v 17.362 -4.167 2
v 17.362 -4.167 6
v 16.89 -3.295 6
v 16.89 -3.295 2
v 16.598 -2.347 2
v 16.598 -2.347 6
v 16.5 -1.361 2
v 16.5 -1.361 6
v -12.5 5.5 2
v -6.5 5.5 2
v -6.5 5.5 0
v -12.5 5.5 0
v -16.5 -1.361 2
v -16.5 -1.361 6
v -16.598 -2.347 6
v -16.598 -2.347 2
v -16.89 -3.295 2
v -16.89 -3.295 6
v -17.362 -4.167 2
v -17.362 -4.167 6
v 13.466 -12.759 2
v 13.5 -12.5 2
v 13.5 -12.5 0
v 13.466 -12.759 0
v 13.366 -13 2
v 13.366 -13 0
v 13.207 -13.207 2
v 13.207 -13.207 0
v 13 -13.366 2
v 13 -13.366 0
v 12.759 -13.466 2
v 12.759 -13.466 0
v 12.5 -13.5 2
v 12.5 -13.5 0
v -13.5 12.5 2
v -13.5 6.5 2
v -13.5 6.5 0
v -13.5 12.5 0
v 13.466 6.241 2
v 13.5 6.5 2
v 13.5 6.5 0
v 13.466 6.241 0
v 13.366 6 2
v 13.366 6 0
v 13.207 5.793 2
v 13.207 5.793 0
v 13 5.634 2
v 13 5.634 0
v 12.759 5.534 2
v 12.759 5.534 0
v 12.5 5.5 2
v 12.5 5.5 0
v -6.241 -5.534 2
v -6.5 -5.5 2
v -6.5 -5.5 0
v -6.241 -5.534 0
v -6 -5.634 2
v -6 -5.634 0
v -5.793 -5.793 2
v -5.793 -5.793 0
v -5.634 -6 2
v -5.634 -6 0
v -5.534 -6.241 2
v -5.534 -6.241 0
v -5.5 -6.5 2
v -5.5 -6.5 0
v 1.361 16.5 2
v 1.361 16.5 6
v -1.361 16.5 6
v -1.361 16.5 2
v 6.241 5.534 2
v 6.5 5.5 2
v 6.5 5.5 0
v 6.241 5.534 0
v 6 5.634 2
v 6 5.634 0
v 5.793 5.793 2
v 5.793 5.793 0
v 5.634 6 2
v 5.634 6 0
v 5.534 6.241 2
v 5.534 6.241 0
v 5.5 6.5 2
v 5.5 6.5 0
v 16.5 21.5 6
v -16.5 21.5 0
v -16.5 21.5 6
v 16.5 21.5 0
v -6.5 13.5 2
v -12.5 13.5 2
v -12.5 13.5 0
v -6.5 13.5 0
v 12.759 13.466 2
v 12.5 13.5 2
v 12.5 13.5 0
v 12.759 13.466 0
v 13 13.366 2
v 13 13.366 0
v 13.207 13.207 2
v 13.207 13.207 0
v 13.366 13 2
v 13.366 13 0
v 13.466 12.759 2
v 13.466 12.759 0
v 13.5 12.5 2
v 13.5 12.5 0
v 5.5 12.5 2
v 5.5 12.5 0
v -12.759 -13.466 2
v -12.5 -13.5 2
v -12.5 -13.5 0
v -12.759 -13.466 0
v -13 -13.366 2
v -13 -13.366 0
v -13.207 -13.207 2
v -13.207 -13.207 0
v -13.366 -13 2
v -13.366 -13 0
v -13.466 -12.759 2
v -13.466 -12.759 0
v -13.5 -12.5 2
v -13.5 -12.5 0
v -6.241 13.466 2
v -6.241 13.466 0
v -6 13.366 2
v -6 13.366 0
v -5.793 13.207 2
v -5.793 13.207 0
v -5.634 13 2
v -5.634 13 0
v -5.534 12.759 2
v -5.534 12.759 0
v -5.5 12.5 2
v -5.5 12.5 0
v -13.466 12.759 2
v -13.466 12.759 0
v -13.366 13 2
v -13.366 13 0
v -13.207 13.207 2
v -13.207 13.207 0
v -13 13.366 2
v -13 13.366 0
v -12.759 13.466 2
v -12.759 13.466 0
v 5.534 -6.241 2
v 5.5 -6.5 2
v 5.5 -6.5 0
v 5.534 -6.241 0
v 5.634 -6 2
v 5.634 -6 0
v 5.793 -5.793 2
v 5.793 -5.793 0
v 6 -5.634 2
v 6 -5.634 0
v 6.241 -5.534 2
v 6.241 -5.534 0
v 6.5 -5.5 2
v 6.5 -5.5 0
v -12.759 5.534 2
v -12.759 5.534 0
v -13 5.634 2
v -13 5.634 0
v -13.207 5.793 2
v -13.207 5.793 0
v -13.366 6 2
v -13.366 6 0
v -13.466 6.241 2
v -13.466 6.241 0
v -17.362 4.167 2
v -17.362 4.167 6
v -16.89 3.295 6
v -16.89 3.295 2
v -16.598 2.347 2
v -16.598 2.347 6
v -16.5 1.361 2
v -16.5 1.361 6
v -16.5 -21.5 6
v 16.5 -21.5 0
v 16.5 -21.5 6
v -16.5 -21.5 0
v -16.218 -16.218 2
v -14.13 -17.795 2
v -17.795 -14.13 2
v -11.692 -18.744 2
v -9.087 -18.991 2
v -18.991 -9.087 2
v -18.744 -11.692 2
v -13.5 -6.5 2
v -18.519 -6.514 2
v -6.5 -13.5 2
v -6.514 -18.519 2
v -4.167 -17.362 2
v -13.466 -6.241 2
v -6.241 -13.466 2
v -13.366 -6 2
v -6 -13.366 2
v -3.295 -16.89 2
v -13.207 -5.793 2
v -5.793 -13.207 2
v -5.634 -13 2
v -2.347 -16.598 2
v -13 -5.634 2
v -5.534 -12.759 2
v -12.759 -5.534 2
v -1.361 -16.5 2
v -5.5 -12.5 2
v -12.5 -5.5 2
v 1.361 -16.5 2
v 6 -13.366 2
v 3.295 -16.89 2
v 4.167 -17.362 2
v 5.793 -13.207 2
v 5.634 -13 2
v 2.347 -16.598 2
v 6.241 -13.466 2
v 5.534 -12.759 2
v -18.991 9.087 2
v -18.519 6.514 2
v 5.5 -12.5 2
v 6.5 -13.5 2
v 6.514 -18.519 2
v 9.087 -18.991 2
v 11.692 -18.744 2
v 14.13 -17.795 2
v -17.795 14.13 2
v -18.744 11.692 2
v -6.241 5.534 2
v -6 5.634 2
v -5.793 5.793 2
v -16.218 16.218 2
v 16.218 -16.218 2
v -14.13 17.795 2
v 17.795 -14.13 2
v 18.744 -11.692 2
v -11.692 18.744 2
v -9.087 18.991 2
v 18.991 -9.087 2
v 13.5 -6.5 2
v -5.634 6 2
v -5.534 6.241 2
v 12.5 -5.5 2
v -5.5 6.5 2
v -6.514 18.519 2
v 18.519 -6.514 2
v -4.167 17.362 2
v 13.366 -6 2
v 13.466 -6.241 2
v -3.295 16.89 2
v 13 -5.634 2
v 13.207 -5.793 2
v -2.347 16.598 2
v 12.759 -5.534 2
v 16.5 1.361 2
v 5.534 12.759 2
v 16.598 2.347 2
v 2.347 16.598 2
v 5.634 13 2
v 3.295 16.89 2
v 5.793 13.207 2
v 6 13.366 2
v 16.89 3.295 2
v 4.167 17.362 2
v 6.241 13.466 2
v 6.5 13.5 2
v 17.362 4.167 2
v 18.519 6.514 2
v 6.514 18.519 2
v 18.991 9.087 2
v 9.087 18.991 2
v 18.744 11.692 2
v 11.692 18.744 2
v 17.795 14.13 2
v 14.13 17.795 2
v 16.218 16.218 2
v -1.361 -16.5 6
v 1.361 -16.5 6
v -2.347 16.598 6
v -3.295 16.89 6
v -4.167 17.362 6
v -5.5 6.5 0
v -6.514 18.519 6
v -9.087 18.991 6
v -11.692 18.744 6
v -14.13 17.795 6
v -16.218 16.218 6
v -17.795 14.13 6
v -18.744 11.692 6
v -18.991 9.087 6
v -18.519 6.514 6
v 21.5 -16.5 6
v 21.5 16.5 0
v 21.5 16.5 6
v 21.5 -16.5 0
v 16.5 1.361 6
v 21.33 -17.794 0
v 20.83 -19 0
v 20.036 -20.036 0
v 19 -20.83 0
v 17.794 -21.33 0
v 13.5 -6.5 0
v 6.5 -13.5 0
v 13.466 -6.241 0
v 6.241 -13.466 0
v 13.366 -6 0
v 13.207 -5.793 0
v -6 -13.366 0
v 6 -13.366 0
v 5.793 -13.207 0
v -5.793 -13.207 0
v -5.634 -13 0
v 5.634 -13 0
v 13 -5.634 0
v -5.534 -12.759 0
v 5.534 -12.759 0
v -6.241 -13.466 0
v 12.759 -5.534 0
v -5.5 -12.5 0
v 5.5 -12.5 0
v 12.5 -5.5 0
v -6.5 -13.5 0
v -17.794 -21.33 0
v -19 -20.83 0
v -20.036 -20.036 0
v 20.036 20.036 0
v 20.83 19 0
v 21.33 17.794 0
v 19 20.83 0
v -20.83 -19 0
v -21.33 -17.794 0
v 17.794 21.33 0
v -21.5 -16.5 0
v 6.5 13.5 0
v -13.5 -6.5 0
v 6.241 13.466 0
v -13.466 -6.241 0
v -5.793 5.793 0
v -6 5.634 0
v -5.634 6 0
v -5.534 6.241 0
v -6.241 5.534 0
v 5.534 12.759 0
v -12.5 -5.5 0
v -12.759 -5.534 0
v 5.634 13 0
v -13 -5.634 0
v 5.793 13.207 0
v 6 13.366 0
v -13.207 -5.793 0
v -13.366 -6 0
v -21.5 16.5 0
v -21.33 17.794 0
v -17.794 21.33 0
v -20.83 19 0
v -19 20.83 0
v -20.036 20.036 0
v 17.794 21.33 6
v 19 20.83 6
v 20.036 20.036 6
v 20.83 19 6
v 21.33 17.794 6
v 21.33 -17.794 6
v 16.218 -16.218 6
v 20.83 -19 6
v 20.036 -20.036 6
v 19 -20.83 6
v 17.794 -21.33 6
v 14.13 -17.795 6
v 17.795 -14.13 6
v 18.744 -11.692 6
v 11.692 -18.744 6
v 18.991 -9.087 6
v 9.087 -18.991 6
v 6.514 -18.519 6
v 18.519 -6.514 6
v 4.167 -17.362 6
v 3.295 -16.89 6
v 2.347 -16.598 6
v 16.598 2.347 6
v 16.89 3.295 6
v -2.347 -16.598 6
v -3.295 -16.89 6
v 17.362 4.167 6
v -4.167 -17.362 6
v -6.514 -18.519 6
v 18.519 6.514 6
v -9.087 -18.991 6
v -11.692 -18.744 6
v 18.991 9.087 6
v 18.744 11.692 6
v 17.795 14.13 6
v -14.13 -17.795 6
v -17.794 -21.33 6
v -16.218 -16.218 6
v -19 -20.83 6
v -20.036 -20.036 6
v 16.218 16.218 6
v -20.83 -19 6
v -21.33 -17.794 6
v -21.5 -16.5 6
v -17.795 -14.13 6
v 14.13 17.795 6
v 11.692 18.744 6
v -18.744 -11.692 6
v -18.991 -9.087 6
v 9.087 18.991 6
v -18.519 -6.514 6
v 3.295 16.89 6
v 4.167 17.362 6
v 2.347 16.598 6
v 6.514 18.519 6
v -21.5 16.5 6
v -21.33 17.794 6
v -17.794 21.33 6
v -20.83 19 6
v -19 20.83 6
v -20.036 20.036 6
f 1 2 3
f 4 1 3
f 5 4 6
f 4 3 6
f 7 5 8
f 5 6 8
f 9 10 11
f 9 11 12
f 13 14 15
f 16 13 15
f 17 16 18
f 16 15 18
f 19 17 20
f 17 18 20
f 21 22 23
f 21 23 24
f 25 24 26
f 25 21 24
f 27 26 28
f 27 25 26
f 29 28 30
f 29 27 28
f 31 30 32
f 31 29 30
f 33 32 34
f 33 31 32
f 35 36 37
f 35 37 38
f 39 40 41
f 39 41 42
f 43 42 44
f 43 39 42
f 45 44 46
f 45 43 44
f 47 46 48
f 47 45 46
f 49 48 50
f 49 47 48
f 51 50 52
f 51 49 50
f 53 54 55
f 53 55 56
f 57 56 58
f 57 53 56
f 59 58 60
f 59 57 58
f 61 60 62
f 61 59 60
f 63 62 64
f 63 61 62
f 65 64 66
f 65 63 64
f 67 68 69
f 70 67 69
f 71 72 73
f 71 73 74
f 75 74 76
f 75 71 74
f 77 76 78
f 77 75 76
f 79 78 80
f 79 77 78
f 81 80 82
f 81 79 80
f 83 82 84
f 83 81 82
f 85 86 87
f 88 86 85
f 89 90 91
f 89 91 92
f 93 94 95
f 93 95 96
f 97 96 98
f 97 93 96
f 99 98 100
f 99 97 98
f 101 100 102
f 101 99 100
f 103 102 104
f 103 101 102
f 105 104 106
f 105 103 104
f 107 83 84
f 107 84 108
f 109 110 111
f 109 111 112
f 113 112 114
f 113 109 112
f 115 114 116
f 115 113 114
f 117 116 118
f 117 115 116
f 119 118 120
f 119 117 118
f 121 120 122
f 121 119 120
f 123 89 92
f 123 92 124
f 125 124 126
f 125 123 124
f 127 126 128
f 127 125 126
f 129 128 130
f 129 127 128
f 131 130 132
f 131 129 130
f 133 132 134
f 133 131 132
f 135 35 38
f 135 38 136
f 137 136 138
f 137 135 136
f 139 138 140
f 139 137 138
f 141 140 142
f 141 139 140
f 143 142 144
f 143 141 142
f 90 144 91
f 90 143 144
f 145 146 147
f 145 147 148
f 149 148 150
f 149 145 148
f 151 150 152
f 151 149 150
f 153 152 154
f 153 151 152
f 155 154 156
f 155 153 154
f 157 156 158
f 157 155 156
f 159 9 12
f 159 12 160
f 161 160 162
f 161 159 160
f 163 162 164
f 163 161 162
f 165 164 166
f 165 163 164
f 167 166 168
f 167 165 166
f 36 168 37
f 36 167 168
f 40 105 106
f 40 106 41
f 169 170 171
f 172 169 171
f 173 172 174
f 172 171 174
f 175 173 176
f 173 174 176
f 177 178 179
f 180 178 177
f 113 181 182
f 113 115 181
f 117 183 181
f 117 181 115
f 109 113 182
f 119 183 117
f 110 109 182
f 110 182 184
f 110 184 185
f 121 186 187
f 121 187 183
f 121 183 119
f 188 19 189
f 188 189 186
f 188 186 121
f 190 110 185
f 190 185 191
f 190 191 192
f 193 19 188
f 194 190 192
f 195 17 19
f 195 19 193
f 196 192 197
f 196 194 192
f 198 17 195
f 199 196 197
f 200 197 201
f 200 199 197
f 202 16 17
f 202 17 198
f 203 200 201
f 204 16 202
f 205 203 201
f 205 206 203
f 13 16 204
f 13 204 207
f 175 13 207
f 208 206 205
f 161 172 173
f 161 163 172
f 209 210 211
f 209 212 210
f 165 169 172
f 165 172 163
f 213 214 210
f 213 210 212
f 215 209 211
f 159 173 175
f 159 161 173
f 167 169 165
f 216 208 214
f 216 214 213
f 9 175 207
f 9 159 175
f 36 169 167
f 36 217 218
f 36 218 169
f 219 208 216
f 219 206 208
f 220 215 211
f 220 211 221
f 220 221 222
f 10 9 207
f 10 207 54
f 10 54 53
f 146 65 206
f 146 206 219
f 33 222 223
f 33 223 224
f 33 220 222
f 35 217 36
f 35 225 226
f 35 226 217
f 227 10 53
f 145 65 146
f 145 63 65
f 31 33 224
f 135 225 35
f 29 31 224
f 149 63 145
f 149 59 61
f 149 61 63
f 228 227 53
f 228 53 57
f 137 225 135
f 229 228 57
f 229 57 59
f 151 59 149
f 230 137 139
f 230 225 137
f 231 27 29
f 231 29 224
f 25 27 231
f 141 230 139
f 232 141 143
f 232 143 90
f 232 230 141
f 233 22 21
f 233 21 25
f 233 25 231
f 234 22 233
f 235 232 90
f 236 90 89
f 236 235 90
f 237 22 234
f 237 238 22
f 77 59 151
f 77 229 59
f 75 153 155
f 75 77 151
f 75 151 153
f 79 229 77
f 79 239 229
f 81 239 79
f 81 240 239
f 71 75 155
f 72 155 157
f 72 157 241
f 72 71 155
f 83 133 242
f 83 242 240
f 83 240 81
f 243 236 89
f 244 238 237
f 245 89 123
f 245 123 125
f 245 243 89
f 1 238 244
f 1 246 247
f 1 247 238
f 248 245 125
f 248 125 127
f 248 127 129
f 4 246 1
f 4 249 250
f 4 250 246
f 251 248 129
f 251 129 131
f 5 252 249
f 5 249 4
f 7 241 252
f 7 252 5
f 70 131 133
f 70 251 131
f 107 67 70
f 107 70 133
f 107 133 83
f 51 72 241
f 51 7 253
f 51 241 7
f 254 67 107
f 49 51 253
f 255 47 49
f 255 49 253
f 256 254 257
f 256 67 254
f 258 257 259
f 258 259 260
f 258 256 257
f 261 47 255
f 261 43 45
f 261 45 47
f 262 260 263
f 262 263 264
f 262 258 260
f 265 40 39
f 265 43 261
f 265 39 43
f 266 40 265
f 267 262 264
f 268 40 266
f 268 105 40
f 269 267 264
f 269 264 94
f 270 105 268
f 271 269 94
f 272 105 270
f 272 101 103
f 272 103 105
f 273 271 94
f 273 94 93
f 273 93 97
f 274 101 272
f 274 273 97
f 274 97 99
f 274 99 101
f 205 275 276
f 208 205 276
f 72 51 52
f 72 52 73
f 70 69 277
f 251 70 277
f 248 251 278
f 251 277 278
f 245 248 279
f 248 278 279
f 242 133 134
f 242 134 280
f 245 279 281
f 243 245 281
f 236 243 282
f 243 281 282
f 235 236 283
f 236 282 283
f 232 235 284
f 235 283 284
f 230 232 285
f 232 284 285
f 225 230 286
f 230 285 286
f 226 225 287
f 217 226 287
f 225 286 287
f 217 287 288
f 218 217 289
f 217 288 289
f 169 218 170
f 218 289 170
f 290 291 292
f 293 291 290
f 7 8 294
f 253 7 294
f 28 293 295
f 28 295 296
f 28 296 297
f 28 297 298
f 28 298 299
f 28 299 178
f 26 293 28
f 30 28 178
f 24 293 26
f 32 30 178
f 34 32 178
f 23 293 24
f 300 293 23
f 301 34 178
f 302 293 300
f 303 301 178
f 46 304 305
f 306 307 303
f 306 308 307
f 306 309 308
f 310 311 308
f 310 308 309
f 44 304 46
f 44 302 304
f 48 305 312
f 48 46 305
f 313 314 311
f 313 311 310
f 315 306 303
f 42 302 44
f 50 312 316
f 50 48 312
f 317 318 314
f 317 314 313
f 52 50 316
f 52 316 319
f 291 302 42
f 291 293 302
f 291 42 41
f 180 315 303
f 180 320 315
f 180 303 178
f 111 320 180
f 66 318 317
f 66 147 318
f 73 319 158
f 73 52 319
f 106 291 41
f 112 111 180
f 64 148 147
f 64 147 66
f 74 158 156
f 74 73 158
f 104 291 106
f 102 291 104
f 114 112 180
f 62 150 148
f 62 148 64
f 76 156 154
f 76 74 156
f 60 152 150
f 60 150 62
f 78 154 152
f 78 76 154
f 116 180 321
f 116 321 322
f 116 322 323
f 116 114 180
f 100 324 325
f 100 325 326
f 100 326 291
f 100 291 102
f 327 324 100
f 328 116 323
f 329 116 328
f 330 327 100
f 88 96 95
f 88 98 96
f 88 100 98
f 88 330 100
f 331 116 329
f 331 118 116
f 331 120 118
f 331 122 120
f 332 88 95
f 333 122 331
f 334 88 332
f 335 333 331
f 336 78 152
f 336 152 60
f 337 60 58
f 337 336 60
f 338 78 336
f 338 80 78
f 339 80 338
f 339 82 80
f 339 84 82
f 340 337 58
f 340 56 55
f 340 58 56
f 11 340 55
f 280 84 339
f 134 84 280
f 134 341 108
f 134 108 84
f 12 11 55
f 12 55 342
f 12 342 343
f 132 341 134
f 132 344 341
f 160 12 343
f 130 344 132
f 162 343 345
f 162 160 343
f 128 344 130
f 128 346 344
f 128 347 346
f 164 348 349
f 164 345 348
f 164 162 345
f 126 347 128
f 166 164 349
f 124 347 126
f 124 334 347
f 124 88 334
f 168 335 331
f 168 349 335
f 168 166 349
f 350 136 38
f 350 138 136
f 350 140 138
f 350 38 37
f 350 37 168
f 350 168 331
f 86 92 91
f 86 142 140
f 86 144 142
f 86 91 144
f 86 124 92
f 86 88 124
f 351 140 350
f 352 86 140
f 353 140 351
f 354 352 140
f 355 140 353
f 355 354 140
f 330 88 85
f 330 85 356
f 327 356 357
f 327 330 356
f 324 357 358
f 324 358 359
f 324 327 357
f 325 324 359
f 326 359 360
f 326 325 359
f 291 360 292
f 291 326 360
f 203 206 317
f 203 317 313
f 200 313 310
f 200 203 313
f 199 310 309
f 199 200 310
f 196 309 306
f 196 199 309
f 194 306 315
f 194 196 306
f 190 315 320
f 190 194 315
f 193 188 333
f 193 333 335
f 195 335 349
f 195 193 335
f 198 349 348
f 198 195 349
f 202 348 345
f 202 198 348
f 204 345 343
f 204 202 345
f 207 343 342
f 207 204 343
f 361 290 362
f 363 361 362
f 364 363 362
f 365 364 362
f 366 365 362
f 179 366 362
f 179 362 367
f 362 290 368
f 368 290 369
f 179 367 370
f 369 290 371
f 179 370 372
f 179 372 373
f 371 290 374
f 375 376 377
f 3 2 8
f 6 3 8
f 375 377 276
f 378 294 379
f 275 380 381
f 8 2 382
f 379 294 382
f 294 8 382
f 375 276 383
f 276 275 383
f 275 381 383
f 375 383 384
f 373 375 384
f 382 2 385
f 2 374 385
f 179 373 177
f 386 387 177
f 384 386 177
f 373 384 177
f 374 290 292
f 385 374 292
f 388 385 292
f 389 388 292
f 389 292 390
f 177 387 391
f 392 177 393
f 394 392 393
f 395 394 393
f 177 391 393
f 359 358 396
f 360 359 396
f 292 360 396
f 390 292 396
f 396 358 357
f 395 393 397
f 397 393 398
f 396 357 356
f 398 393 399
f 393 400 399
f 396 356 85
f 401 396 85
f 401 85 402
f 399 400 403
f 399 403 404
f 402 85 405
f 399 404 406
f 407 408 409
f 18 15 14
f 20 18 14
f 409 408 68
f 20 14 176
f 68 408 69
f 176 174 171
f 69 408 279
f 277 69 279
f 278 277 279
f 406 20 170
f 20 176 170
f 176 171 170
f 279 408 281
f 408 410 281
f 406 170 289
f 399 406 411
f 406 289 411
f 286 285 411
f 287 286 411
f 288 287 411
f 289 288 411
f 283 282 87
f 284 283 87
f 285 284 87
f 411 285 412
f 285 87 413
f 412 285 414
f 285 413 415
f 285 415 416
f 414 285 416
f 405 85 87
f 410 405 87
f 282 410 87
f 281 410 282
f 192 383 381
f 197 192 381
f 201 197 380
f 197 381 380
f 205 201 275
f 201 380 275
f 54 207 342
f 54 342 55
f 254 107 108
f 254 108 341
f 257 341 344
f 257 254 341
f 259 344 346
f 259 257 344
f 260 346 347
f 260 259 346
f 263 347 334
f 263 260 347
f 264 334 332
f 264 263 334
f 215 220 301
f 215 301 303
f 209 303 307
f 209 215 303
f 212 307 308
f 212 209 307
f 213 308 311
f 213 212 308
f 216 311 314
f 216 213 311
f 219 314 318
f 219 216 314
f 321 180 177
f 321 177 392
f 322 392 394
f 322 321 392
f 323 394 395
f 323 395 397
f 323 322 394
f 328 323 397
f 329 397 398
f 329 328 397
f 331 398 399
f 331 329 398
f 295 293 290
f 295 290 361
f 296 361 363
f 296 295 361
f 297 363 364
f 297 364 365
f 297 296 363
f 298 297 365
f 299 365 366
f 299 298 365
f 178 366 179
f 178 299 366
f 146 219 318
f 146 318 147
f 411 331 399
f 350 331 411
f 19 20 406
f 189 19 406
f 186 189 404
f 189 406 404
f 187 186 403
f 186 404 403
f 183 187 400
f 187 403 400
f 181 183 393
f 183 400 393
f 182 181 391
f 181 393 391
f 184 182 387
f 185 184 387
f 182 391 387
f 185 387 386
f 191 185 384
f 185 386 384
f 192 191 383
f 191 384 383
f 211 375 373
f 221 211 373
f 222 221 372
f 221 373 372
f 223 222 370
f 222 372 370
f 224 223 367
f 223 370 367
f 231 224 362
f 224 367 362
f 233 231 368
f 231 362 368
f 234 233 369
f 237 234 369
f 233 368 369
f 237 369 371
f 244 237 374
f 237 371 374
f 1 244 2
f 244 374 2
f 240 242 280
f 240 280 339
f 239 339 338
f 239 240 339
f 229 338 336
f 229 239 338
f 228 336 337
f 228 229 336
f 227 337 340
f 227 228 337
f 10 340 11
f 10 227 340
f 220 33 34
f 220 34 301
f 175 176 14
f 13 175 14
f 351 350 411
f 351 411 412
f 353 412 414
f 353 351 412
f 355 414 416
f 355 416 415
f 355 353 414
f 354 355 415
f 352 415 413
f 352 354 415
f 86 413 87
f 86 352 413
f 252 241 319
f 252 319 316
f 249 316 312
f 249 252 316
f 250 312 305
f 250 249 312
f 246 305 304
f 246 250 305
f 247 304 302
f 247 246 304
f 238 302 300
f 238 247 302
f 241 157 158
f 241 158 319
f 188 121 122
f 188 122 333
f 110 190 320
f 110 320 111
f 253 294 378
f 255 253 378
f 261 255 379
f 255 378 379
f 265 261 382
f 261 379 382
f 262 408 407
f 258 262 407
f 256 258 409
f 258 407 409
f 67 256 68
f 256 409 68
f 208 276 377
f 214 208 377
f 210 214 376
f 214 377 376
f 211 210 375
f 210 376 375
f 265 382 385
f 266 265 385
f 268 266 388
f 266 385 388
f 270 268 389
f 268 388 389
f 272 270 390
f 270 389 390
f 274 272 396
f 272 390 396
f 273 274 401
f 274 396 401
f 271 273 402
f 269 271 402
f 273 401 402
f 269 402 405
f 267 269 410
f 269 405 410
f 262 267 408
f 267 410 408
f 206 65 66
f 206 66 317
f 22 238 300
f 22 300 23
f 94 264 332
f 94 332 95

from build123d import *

# Parameters (mm, degrees)
DODANIE_WYCI_GNI_CIE1_DEPTH = 6
WYTNIJ_WYCI_GNI_CIE2_DEPTH  = 4
WYTNIJ_WYCI_GNI_CIE3_DEPTH  = 2


with BuildPart() as part:
    # Szkic1 → Dodanie-wyciągnięcie1 (new body)
    with BuildSketch(Plane.XY):
        with BuildLine():
            Line((-16.5, 21.5), (16.5, 21.5))
            ThreePointArc((16.5, 21.5), (20.035533906, 20.035533906), (21.5, 16.5))
            Line((21.5, 16.5), (21.5, -16.5))
            ThreePointArc((21.5, -16.5), (20.035533906, -20.035533906), (16.5, -21.5))
            Line((16.5, -21.5), (-16.5, -21.5))
            ThreePointArc((-16.5, -21.5), (-20.035533906, -20.035533906), (-21.5, -16.5))
            Line((-21.5, -16.5), (-21.5, 16.5))
            ThreePointArc((-21.5, 16.5), (-20.035533906, 20.035533906), (-16.5, 21.5))
        make_face()
    extrude(amount=DODANIE_WYCI_GNI_CIE1_DEPTH)

    # Szkic2 → Wytnij-wyciągnięcie2 (cut)
    with BuildSketch(Plane.XY.offset(6)):
        with BuildLine():
            Line((-16.5, 1.360589702), (-16.5, -1.360589702))
            ThreePointArc((-16.5, -1.360589702), (-16.720373698, -2.828640251), (-17.362068966, -4.167282908))
            ThreePointArc((-17.362068966, -4.167282908), (-16.217514421, -16.217514421), (-4.167282908, -17.362068966))
            ThreePointArc((-4.167282908, -17.362068966), (-2.828640251, -16.720373698), (-1.360589702, -16.5))
            Line((-1.360589702, -16.5), (1.360589702, -16.5))
            ThreePointArc((1.360589702, -16.5), (2.828640251, -16.720373698), (4.167282908, -17.362068966))
            ThreePointArc((4.167282908, -17.362068966), (16.217514421, -16.217514421), (17.362068966, -4.167282908))
            ThreePointArc((17.362068966, -4.167282908), (16.720373698, -2.828640251), (16.5, -1.360589702))
            Line((16.5, -1.360589702), (16.5, 1.360589702))
            ThreePointArc((16.5, 1.360589702), (16.720373698, 2.828640251), (17.362068966, 4.167282908))
            ThreePointArc((17.362068966, 4.167282908), (16.217514421, 16.217514421), (4.167282908, 17.362068966))
            ThreePointArc((4.167282908, 17.362068966), (2.828640251, 16.720373698), (1.360589702, 16.5))
            Line((1.360589702, 16.5), (-1.360589702, 16.5))
            ThreePointArc((-1.360589702, 16.5), (-2.828640251, 16.720373698), (-4.167282908, 17.362068966))
            ThreePointArc((-4.167282908, 17.362068966), (-16.217514421, 16.217514421), (-17.362068966, 4.167282908))
            ThreePointArc((-17.362068966, 4.167282908), (-16.720373698, 2.828640251), (-16.5, 1.360589702))
        make_face()
    extrude(amount=-WYTNIJ_WYCI_GNI_CIE2_DEPTH, mode=Mode.SUBTRACT)

    # Szkic3 → Wytnij-wyciągnięcie3 (cut)
    with BuildSketch(Plane.XY.offset(2)):
        with BuildLine():
            Line((6.5, -5.5), (12.5, -5.5))
            ThreePointArc((12.5, -5.5), (13.207106781, -5.792893219), (13.5, -6.5))
            Line((13.5, -6.5), (13.5, -12.5))
            ThreePointArc((13.5, -12.5), (13.207106781, -13.207106781), (12.5, -13.5))
            Line((12.5, -13.5), (6.5, -13.5))
            ThreePointArc((6.5, -13.5), (5.792893219, -13.207106781), (5.5, -12.5))
            Line((5.5, -12.5), (5.5, -6.5))
            ThreePointArc((5.5, -6.5), (5.792893219, -5.792893219), (6.5, -5.5))
        make_face()
        with BuildLine():
            Line((6.5, 13.5), (12.5, 13.5))
            ThreePointArc((12.5, 13.5), (13.207106781, 13.207106781), (13.5, 12.5))
            Line((13.5, 12.5), (13.5, 6.5))
            ThreePointArc((13.5, 6.5), (13.207106781, 5.792893219), (12.5, 5.5))
            Line((12.5, 5.5), (6.5, 5.5))
            ThreePointArc((6.5, 5.5), (5.792893219, 5.792893219), (5.5, 6.5))
            Line((5.5, 6.5), (5.5, 12.5))
            ThreePointArc((5.5, 12.5), (5.792893219, 13.207106781), (6.5, 13.5))
        make_face()
        with BuildLine():
            Line((-12.5, -5.5), (-6.5, -5.5))
            ThreePointArc((-6.5, -5.5), (-5.792893219, -5.792893219), (-5.5, -6.5))
            Line((-5.5, -6.5), (-5.5, -12.5))
            ThreePointArc((-5.5, -12.5), (-5.792893219, -13.207106781), (-6.5, -13.5))
            Line((-6.5, -13.5), (-12.5, -13.5))
            ThreePointArc((-12.5, -13.5), (-13.207106781, -13.207106781), (-13.5, -12.5))
            Line((-13.5, -12.5), (-13.5, -6.5))
            ThreePointArc((-13.5, -6.5), (-13.207106781, -5.792893219), (-12.5, -5.5))
        make_face()
        with BuildLine():
            Line((-12.5, 13.5), (-6.5, 13.5))
            ThreePointArc((-6.5, 13.5), (-5.792893219, 13.207106781), (-5.5, 12.5))
            Line((-5.5, 12.5), (-5.5, 6.5))
            ThreePointArc((-5.5, 6.5), (-5.792893219, 5.792893219), (-6.5, 5.5))
            Line((-6.5, 5.5), (-12.5, 5.5))
            ThreePointArc((-12.5, 5.5), (-13.207106781, 5.792893219), (-13.5, 6.5))
            Line((-13.5, 6.5), (-13.5, 12.5))
            ThreePointArc((-13.5, 12.5), (-13.207106781, 13.207106781), (-12.5, 13.5))
        make_face()
    extrude(amount=-WYTNIJ_WYCI_GNI_CIE3_DEPTH, mode=Mode.SUBTRACT)


solid = part.part
